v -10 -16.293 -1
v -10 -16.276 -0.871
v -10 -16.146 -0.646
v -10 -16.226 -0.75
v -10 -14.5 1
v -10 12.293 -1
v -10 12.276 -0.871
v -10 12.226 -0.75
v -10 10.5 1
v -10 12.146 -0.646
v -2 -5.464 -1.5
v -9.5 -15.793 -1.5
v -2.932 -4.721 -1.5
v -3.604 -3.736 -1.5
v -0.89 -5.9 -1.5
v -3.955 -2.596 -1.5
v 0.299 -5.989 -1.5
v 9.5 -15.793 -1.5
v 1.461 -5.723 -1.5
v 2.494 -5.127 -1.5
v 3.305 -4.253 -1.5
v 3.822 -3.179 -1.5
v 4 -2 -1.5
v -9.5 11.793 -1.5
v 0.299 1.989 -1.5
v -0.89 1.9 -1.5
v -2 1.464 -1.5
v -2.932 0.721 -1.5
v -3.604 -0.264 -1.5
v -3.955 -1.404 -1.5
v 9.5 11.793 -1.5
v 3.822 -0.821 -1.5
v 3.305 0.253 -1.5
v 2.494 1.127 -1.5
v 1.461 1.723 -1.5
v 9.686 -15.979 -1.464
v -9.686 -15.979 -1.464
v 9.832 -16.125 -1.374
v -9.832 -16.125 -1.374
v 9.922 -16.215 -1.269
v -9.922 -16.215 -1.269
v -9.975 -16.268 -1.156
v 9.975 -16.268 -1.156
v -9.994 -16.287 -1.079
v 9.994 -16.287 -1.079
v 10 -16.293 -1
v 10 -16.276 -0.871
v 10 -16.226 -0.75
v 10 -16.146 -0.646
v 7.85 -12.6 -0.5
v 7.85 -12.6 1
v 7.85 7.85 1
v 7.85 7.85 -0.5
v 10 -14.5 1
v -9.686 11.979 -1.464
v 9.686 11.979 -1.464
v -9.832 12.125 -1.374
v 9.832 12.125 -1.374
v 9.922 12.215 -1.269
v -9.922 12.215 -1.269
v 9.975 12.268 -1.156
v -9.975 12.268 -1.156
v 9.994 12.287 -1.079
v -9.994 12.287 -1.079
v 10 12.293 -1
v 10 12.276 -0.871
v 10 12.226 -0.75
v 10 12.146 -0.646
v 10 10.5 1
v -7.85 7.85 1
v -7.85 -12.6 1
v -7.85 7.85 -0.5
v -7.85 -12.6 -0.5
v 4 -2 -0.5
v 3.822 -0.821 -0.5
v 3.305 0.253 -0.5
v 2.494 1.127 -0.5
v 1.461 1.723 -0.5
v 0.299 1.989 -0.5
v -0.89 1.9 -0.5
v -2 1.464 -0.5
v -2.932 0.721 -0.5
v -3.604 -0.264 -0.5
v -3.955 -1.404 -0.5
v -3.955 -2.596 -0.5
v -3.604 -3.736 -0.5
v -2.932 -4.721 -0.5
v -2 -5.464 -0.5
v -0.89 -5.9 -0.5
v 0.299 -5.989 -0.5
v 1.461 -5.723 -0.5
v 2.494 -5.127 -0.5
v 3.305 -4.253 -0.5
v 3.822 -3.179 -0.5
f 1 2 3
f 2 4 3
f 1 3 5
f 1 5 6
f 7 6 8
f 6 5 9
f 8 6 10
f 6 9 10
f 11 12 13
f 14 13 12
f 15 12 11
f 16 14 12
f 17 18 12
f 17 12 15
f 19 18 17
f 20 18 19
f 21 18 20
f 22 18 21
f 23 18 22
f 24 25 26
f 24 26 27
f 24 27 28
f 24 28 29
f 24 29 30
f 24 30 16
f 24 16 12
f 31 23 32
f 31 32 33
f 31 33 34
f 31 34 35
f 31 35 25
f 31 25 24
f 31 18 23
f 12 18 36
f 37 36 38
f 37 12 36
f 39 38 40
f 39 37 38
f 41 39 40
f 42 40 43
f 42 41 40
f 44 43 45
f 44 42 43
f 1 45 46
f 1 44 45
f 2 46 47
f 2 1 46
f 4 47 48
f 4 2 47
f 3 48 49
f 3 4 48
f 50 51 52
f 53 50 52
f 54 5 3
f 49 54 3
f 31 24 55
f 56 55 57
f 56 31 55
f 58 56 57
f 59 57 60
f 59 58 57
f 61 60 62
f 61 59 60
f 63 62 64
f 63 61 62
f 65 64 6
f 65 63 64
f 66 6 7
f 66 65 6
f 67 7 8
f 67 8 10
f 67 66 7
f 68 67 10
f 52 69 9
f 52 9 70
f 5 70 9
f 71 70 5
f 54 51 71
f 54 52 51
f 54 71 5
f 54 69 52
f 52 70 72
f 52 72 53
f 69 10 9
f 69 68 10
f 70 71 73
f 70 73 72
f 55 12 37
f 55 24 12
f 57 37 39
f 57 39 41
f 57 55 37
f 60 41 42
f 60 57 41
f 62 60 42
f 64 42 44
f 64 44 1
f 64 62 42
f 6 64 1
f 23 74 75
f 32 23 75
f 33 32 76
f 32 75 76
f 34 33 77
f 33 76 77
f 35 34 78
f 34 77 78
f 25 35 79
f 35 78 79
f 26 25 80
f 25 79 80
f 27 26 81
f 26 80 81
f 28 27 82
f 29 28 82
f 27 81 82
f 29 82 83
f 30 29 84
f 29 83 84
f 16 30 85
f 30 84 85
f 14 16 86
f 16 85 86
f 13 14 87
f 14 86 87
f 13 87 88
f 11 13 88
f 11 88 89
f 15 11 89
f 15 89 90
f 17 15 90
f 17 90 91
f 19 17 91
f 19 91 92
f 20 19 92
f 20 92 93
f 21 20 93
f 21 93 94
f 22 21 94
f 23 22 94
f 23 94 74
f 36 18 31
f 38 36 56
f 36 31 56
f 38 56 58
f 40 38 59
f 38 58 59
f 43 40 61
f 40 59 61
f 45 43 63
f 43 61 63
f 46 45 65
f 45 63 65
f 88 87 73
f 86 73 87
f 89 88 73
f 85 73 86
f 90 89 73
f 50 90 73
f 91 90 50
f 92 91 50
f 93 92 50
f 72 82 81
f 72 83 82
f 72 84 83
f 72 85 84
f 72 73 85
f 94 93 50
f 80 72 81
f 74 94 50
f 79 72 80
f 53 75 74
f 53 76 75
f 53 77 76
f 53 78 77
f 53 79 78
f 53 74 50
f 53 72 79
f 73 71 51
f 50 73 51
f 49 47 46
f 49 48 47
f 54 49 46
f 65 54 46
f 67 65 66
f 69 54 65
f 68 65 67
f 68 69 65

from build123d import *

# Parameters (mm, degrees)
PAD031_DEPTH    = 10
SKETCH069_W     = 15.7
SKETCH069_H     = 20.45
POCKET022_DEPTH = 1.5
FILLET010_R     = 0.5
SKETCH083_R     = 4
POCKET024_DEPTH = 4.001


with BuildPart() as part:
    # Sketch068 → Pad031 (new body, symmetric)
    with BuildSketch(Plane.YZ):
        Polygon((-15, -4), (15, -4), (12.5, -1.5), (-12.5, -1.5), align=None)
    extrude(amount=PAD031_DEPTH, both=True)

    # Sketch069 → Pocket022 (cut)
    with BuildSketch(Plane(origin=(0, 2, -1.5), x_dir=(1, 0, 0), z_dir=(0, 0, 1))):
        with Locations((0, -2.375)):
            Rectangle(SKETCH069_W, SKETCH069_H)
    extrude(amount=-POCKET022_DEPTH, mode=Mode.SUBTRACT)

    # Fillet010
    fillet010_edges = [part.edges().sort_by_distance(p)[0] for p in [
        (0, -15, -4),
        (0, 15, -4),
        (-10, 0, -4),
        (10, 0, -4),
    ]]
    fillet(fillet010_edges, radius=FILLET010_R)

    # Sketch083 → Pocket024 (cut, through all)
    with BuildSketch(Plane.XY):
        Circle(SKETCH083_R)
    extrude(amount=-POCKET024_DEPTH, mode=Mode.SUBTRACT)


with BuildPart() as part_1:
    # Body022 placement: moved
    add(part.part.moved(Location((0, -2, 2.5))))


solid = part_1.part
